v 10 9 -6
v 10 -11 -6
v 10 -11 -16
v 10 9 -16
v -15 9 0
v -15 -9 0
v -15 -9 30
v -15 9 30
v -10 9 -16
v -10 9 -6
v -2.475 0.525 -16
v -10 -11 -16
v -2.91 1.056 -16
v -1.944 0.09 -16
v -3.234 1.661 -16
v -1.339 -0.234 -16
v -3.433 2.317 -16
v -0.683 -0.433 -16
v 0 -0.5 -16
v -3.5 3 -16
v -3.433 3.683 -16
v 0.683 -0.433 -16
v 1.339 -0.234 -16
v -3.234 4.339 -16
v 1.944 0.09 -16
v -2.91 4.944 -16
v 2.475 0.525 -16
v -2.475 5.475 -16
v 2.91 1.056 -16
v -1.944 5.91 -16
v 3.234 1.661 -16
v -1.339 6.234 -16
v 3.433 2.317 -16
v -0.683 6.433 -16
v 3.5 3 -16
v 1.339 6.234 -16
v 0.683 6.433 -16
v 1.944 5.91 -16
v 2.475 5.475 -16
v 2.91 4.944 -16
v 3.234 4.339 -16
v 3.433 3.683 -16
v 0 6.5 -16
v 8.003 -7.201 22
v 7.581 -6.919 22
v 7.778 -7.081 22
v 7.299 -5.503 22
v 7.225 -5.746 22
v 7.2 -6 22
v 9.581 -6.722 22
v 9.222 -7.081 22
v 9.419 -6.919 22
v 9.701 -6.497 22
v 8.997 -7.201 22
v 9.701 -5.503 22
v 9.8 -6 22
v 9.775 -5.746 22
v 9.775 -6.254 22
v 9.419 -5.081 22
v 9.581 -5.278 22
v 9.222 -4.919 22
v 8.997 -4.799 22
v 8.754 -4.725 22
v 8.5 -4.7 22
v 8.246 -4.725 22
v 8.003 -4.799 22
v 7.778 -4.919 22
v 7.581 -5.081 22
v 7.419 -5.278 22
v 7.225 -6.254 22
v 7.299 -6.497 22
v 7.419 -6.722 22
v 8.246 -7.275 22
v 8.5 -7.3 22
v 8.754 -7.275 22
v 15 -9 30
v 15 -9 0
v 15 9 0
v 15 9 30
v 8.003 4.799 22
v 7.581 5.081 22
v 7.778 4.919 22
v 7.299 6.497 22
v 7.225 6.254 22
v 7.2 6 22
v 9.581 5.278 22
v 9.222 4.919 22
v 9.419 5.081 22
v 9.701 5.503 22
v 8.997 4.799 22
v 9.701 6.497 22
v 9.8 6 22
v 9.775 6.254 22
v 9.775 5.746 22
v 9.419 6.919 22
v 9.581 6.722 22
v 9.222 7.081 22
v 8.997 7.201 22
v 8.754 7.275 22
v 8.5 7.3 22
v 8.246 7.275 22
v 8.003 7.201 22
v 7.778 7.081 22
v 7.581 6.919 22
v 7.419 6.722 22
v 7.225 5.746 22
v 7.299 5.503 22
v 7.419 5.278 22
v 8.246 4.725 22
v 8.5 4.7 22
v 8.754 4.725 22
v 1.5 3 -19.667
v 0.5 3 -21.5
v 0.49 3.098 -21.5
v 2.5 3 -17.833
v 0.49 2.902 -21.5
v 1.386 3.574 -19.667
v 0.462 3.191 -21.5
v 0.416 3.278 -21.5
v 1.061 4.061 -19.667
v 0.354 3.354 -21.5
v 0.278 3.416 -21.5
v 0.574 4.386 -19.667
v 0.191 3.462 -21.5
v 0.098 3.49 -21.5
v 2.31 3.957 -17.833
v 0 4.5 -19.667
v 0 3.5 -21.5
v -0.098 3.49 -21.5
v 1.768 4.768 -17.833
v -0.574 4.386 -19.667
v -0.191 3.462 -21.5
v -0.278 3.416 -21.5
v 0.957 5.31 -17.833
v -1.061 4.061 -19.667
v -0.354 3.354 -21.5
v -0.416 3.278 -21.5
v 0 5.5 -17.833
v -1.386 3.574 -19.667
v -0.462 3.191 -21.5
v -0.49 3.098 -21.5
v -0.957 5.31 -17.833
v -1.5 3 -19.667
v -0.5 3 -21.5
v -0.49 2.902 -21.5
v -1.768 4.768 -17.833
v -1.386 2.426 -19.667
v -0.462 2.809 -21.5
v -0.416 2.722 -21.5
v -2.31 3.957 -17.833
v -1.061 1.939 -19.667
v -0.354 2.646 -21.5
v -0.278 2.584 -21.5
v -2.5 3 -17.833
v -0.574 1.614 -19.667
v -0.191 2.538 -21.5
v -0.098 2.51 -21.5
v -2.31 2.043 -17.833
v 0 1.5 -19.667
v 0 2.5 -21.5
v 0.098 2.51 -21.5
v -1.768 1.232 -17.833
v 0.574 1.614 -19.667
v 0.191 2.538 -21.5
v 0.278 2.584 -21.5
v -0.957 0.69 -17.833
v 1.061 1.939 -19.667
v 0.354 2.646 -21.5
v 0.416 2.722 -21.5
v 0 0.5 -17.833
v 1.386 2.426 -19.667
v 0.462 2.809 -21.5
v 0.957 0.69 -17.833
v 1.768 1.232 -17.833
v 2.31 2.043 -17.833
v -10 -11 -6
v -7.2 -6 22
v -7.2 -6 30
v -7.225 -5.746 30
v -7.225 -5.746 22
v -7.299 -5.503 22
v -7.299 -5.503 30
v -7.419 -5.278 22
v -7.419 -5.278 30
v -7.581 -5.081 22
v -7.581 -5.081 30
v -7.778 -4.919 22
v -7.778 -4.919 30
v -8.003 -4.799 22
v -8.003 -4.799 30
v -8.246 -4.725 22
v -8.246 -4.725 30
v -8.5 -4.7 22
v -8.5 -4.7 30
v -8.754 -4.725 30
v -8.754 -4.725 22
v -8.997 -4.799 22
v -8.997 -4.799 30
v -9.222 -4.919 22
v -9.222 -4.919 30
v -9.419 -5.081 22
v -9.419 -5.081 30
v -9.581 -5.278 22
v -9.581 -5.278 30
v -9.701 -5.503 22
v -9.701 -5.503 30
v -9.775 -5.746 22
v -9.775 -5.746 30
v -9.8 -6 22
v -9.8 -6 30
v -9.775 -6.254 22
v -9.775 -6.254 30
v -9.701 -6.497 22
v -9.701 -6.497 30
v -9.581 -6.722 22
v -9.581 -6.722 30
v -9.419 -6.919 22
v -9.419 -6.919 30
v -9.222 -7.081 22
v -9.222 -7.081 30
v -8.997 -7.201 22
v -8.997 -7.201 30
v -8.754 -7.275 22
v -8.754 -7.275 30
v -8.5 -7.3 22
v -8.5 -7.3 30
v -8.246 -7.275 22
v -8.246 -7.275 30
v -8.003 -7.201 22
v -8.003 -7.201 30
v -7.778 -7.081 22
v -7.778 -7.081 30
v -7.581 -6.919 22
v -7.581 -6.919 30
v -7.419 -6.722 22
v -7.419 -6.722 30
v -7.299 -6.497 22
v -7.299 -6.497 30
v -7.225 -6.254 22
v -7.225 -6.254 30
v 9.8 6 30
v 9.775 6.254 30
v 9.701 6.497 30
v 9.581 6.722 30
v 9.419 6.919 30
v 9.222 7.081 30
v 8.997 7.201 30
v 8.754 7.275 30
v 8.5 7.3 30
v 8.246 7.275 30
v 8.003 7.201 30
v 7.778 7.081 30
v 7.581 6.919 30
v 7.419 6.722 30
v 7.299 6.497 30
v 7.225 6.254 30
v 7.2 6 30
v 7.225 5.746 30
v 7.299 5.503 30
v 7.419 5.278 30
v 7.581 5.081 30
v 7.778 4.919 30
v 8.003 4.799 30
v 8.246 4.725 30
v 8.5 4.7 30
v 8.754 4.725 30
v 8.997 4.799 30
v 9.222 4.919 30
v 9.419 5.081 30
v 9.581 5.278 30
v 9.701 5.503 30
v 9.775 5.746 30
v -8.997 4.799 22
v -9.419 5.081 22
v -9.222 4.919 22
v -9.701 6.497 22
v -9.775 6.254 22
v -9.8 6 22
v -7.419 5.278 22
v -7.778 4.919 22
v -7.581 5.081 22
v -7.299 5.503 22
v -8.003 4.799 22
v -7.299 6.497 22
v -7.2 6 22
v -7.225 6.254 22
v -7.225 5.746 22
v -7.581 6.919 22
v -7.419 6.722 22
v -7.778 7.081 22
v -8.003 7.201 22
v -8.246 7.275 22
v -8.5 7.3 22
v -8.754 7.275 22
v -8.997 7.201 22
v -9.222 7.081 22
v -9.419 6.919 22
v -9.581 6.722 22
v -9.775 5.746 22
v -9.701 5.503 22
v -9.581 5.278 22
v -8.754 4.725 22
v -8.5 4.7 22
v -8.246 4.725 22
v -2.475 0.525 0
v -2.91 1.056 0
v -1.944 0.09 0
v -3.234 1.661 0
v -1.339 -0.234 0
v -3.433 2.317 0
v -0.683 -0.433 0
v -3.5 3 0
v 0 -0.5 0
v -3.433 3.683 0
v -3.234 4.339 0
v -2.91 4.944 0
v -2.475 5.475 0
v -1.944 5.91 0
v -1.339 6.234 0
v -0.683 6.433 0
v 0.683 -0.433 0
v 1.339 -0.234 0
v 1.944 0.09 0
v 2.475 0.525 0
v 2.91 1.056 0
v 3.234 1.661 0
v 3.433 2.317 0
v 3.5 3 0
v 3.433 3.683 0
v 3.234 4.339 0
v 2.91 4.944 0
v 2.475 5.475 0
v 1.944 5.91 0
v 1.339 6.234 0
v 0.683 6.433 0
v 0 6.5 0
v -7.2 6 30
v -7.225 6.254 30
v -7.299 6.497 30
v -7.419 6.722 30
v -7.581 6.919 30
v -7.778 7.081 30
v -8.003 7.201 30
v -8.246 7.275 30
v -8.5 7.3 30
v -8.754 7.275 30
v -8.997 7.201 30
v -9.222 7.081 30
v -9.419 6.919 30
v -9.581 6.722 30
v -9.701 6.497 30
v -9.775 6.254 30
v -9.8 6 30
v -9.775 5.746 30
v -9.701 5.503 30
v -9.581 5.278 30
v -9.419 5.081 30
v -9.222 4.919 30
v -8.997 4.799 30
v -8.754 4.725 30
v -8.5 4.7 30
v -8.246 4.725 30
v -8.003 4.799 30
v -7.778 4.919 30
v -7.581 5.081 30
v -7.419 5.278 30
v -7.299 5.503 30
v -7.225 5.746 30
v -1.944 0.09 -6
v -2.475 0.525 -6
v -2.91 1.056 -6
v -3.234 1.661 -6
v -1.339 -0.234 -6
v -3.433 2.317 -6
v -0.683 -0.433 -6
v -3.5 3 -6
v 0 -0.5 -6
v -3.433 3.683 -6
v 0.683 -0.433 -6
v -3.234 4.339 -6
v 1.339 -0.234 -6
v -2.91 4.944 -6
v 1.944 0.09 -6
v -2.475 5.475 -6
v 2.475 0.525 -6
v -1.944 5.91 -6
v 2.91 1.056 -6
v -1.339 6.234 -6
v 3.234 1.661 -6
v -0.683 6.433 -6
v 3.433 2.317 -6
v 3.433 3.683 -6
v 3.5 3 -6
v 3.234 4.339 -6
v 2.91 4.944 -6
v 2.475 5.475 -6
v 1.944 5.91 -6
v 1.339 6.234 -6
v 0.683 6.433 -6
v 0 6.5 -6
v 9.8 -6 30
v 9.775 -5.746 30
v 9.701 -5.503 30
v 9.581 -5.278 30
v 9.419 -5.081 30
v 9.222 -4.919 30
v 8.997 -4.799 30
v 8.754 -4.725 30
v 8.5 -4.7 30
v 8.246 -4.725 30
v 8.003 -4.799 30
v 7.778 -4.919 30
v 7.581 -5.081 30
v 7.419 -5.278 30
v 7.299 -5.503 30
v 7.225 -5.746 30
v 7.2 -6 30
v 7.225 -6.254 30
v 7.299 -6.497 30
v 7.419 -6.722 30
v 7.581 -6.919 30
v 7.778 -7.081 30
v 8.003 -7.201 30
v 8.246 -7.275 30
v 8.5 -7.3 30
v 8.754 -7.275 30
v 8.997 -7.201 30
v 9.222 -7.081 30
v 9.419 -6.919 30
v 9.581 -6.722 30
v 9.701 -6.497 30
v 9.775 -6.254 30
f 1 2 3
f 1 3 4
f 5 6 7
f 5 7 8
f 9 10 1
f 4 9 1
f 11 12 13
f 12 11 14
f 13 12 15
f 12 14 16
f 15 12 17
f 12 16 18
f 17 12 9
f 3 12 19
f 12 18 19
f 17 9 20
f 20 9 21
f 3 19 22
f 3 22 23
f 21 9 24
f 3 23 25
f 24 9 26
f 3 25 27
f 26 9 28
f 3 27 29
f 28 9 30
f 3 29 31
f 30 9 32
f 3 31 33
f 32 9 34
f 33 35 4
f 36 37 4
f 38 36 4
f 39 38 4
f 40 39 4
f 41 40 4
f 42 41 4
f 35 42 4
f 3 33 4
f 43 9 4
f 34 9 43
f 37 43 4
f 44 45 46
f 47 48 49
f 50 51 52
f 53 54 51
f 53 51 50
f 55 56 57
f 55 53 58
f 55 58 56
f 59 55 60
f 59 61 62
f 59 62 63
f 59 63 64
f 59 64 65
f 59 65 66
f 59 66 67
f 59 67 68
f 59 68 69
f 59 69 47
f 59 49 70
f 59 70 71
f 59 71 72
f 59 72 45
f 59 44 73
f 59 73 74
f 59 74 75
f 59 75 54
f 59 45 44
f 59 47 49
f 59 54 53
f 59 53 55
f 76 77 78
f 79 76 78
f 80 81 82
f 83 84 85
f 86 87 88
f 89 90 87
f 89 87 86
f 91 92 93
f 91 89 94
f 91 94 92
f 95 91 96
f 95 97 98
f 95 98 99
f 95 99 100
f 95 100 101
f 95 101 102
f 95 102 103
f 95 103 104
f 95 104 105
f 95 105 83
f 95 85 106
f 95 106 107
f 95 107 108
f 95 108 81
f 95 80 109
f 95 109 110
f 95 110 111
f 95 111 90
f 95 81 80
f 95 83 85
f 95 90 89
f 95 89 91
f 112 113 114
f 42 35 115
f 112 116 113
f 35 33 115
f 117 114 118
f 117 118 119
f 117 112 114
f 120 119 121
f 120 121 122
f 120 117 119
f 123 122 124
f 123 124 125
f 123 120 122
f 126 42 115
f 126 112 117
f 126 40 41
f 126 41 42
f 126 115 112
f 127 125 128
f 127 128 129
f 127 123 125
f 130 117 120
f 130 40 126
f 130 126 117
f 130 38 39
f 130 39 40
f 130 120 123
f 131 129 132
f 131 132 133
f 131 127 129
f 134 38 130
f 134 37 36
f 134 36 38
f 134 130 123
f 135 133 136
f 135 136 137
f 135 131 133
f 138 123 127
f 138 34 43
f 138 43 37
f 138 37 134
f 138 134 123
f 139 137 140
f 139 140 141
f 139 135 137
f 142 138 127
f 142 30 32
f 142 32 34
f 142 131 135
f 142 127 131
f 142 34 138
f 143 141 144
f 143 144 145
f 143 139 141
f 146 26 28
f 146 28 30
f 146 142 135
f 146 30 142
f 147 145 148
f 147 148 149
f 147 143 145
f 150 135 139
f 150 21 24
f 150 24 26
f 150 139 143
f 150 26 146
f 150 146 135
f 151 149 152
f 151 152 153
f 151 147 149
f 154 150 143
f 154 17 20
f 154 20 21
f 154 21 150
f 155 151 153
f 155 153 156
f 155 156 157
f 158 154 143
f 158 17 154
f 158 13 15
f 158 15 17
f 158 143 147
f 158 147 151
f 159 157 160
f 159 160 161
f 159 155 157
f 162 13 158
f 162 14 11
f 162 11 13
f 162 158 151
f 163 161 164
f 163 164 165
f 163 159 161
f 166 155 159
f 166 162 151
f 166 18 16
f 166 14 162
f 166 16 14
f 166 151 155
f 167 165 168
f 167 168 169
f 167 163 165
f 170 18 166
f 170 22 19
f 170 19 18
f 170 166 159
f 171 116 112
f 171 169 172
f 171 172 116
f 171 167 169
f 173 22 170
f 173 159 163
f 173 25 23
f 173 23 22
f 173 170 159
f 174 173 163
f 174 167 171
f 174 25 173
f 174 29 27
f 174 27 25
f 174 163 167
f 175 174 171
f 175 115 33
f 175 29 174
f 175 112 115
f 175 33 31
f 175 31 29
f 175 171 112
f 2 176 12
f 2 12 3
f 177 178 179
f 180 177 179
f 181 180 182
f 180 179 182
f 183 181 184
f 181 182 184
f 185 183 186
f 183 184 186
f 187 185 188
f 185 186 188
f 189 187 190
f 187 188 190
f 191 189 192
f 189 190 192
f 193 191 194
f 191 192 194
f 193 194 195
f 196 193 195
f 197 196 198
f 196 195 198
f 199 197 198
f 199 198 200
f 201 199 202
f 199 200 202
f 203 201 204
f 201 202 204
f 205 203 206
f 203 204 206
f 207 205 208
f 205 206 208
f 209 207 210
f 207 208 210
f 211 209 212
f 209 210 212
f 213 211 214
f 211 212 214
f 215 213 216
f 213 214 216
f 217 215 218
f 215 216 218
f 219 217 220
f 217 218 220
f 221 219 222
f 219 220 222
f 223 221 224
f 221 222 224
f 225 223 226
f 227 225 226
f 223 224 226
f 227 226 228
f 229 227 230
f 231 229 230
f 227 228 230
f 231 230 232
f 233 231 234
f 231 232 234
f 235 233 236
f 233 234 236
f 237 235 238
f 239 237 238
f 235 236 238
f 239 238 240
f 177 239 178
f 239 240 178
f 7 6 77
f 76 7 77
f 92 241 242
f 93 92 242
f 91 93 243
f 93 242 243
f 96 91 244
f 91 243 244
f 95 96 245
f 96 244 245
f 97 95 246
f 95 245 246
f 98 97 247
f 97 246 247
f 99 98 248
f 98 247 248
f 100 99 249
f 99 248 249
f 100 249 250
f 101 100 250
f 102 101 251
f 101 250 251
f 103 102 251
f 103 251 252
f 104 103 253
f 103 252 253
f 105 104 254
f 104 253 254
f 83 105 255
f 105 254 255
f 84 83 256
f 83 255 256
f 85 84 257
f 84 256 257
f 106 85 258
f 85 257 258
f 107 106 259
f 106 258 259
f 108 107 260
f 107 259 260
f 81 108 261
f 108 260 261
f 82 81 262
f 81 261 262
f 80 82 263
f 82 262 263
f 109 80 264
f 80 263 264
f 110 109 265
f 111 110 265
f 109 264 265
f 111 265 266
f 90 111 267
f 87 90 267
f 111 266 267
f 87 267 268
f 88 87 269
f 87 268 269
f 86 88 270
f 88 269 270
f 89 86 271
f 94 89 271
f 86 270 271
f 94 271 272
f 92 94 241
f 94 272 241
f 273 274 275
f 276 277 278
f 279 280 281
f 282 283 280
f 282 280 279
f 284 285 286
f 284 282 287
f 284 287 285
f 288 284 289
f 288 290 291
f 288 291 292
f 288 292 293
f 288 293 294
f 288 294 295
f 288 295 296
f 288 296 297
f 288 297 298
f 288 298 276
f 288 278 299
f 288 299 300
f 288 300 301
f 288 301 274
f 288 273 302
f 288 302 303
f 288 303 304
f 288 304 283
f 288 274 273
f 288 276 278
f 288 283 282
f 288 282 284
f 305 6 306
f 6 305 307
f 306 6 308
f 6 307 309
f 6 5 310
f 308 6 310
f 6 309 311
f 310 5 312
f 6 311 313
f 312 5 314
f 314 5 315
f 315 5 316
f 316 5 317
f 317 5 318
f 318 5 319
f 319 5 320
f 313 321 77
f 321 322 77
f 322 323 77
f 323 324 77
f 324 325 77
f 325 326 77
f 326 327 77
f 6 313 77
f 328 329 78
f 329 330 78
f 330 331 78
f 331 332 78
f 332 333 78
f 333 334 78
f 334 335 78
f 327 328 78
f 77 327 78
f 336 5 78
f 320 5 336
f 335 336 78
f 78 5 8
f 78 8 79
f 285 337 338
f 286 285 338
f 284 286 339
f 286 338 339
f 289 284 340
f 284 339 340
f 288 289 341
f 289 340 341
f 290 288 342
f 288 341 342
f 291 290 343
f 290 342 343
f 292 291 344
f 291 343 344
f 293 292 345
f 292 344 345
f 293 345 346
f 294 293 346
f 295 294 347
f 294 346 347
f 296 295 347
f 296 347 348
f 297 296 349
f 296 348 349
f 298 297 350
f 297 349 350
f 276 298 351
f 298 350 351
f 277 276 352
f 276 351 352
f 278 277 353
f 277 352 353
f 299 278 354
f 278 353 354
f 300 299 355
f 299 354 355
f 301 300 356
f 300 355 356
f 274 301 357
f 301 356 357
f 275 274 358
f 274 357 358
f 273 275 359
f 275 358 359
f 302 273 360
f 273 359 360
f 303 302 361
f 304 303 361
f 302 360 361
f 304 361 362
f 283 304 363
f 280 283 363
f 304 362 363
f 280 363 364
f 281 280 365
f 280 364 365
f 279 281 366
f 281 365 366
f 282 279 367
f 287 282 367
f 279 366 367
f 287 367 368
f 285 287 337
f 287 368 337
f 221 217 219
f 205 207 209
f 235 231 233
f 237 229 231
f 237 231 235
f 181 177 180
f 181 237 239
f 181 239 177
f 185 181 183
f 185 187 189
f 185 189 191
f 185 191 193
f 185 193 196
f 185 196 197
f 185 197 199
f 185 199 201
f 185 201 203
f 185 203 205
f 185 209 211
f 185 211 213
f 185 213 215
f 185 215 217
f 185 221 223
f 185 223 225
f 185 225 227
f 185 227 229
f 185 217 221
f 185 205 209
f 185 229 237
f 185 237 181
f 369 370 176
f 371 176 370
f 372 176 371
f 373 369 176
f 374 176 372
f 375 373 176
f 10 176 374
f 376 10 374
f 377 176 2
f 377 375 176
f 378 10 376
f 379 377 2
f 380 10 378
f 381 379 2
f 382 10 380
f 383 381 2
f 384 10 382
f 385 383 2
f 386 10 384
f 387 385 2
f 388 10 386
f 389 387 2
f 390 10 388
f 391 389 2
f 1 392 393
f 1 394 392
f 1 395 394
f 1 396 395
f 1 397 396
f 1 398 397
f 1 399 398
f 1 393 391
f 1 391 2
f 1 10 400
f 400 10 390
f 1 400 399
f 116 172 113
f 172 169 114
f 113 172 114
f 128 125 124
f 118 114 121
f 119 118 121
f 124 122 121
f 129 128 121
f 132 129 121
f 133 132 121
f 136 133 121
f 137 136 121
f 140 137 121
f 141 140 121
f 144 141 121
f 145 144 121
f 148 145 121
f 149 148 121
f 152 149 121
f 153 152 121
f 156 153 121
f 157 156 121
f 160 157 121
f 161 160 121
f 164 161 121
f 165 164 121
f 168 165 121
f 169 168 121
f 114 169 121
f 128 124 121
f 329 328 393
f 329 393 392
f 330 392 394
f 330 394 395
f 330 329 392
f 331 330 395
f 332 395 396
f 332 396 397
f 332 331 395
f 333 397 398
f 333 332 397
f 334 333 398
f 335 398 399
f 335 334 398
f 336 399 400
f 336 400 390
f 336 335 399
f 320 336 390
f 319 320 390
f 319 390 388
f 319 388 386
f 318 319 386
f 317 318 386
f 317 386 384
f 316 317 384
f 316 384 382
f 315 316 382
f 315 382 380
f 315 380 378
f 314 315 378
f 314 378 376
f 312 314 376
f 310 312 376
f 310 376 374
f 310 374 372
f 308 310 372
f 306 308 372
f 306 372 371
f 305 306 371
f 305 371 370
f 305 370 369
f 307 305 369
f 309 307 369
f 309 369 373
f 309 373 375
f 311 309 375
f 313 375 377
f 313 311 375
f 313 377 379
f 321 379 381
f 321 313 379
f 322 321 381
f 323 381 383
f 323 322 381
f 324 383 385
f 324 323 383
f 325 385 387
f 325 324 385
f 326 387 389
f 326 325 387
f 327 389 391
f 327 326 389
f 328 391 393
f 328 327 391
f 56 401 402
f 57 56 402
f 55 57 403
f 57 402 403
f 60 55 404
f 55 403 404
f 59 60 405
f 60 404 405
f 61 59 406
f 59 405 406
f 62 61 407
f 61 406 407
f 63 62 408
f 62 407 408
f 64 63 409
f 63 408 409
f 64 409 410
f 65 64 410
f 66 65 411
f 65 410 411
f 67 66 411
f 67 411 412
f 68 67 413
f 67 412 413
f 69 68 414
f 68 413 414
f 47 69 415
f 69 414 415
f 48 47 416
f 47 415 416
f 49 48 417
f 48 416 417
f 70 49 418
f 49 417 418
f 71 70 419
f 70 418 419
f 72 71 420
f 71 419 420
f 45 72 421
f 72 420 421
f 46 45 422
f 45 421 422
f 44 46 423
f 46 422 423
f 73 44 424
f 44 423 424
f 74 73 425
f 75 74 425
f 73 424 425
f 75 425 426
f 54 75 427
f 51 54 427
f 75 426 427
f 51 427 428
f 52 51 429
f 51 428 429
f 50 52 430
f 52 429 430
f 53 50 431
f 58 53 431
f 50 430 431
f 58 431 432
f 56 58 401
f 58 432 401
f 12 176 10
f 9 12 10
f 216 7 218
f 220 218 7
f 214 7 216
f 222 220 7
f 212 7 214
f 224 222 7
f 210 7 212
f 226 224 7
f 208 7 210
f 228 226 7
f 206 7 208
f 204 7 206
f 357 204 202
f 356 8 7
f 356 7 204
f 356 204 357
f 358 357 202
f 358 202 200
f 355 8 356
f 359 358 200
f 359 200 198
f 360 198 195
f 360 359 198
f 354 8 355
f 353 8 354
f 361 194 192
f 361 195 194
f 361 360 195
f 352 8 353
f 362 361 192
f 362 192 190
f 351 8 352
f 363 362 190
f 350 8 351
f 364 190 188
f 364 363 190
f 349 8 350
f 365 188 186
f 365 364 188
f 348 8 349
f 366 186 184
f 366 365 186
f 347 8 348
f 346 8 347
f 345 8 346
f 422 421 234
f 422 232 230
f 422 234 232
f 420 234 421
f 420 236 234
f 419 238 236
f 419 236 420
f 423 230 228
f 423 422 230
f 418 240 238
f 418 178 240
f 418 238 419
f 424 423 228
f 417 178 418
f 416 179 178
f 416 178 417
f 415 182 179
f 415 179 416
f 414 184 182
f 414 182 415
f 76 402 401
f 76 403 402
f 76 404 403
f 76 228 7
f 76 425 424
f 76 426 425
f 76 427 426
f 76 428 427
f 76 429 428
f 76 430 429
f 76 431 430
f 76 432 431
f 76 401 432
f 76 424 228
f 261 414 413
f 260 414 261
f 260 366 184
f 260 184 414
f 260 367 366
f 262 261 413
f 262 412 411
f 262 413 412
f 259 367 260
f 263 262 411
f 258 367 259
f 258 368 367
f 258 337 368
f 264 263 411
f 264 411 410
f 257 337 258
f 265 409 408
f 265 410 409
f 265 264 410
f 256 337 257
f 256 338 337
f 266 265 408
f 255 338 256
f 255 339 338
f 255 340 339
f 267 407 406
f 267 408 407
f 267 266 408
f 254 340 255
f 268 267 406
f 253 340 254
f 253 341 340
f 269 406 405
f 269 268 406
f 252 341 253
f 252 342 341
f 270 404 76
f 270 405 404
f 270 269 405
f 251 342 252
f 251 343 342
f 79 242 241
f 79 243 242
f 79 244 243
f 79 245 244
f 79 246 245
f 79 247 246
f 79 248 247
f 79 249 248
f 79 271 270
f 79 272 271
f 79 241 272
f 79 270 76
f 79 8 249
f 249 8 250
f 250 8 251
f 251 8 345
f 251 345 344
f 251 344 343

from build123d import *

# Parameters (mm, degrees)
F0_W      = 30
F0_H      = 18
F1_DEPTH  = 30
F3_W      = 20
F3_H      = 20
F5_DEPTH  = 10
F4_R      = 3.5
F6_DEPTH  = 46
F9_R      = 0.5
F7_R      = 3.5
F11_R     = 1.3
F12_DEPTH = 8


with BuildPart() as f1:
    # F0 (on Top) → F1 (new body)
    with BuildSketch(Plane.XY):
        Rectangle(F0_W, F0_H)
    extrude(amount=F1_DEPTH)



with BuildPart() as f5:
    # F3 (on offset) → F5 (new body)
    with BuildSketch(Plane.XY.offset(-6)):
        with Locations((0, -1)):
            Rectangle(F3_W, F3_H)
    extrude(amount=-F5_DEPTH)


with BuildPart() as f1_1:
    add(f1.part)

    add(f5.part)  # F6 merges F5
    # F4 (on face) → F6 (join, through all)
    with BuildSketch(Plane.XY.offset(30)):
        with Locations((0, 3)):
            Circle(F4_R)
    extrude(amount=-F6_DEPTH)

    # F9 (on offset) → F10 section 0
    with BuildSketch(Plane.XY.offset(-21.5)):
        with Locations((0, 3)):
            Circle(F9_R)
    # F7 (on face) → F10 section 1
    with BuildSketch(Plane(origin=(0, 0, -16), x_dir=(1, 0, 0), z_dir=(0, 0, -1))):
        with Locations((0, -3)):
            Circle(F7_R)
    loft()

    # F11 (on face) → F12 (cut)
    with BuildSketch(Plane.XY.offset(30)):
        with Locations((-8.5, 6)):
            Circle(F11_R)
        with Locations((8.5, 6)):
            Circle(F11_R)
        with Locations((8.5, -6)):
            Circle(F11_R)
        with Locations((-8.5, -6)):
            Circle(F11_R)
    extrude(amount=-F12_DEPTH, mode=Mode.SUBTRACT)


solid = f1_1.part
